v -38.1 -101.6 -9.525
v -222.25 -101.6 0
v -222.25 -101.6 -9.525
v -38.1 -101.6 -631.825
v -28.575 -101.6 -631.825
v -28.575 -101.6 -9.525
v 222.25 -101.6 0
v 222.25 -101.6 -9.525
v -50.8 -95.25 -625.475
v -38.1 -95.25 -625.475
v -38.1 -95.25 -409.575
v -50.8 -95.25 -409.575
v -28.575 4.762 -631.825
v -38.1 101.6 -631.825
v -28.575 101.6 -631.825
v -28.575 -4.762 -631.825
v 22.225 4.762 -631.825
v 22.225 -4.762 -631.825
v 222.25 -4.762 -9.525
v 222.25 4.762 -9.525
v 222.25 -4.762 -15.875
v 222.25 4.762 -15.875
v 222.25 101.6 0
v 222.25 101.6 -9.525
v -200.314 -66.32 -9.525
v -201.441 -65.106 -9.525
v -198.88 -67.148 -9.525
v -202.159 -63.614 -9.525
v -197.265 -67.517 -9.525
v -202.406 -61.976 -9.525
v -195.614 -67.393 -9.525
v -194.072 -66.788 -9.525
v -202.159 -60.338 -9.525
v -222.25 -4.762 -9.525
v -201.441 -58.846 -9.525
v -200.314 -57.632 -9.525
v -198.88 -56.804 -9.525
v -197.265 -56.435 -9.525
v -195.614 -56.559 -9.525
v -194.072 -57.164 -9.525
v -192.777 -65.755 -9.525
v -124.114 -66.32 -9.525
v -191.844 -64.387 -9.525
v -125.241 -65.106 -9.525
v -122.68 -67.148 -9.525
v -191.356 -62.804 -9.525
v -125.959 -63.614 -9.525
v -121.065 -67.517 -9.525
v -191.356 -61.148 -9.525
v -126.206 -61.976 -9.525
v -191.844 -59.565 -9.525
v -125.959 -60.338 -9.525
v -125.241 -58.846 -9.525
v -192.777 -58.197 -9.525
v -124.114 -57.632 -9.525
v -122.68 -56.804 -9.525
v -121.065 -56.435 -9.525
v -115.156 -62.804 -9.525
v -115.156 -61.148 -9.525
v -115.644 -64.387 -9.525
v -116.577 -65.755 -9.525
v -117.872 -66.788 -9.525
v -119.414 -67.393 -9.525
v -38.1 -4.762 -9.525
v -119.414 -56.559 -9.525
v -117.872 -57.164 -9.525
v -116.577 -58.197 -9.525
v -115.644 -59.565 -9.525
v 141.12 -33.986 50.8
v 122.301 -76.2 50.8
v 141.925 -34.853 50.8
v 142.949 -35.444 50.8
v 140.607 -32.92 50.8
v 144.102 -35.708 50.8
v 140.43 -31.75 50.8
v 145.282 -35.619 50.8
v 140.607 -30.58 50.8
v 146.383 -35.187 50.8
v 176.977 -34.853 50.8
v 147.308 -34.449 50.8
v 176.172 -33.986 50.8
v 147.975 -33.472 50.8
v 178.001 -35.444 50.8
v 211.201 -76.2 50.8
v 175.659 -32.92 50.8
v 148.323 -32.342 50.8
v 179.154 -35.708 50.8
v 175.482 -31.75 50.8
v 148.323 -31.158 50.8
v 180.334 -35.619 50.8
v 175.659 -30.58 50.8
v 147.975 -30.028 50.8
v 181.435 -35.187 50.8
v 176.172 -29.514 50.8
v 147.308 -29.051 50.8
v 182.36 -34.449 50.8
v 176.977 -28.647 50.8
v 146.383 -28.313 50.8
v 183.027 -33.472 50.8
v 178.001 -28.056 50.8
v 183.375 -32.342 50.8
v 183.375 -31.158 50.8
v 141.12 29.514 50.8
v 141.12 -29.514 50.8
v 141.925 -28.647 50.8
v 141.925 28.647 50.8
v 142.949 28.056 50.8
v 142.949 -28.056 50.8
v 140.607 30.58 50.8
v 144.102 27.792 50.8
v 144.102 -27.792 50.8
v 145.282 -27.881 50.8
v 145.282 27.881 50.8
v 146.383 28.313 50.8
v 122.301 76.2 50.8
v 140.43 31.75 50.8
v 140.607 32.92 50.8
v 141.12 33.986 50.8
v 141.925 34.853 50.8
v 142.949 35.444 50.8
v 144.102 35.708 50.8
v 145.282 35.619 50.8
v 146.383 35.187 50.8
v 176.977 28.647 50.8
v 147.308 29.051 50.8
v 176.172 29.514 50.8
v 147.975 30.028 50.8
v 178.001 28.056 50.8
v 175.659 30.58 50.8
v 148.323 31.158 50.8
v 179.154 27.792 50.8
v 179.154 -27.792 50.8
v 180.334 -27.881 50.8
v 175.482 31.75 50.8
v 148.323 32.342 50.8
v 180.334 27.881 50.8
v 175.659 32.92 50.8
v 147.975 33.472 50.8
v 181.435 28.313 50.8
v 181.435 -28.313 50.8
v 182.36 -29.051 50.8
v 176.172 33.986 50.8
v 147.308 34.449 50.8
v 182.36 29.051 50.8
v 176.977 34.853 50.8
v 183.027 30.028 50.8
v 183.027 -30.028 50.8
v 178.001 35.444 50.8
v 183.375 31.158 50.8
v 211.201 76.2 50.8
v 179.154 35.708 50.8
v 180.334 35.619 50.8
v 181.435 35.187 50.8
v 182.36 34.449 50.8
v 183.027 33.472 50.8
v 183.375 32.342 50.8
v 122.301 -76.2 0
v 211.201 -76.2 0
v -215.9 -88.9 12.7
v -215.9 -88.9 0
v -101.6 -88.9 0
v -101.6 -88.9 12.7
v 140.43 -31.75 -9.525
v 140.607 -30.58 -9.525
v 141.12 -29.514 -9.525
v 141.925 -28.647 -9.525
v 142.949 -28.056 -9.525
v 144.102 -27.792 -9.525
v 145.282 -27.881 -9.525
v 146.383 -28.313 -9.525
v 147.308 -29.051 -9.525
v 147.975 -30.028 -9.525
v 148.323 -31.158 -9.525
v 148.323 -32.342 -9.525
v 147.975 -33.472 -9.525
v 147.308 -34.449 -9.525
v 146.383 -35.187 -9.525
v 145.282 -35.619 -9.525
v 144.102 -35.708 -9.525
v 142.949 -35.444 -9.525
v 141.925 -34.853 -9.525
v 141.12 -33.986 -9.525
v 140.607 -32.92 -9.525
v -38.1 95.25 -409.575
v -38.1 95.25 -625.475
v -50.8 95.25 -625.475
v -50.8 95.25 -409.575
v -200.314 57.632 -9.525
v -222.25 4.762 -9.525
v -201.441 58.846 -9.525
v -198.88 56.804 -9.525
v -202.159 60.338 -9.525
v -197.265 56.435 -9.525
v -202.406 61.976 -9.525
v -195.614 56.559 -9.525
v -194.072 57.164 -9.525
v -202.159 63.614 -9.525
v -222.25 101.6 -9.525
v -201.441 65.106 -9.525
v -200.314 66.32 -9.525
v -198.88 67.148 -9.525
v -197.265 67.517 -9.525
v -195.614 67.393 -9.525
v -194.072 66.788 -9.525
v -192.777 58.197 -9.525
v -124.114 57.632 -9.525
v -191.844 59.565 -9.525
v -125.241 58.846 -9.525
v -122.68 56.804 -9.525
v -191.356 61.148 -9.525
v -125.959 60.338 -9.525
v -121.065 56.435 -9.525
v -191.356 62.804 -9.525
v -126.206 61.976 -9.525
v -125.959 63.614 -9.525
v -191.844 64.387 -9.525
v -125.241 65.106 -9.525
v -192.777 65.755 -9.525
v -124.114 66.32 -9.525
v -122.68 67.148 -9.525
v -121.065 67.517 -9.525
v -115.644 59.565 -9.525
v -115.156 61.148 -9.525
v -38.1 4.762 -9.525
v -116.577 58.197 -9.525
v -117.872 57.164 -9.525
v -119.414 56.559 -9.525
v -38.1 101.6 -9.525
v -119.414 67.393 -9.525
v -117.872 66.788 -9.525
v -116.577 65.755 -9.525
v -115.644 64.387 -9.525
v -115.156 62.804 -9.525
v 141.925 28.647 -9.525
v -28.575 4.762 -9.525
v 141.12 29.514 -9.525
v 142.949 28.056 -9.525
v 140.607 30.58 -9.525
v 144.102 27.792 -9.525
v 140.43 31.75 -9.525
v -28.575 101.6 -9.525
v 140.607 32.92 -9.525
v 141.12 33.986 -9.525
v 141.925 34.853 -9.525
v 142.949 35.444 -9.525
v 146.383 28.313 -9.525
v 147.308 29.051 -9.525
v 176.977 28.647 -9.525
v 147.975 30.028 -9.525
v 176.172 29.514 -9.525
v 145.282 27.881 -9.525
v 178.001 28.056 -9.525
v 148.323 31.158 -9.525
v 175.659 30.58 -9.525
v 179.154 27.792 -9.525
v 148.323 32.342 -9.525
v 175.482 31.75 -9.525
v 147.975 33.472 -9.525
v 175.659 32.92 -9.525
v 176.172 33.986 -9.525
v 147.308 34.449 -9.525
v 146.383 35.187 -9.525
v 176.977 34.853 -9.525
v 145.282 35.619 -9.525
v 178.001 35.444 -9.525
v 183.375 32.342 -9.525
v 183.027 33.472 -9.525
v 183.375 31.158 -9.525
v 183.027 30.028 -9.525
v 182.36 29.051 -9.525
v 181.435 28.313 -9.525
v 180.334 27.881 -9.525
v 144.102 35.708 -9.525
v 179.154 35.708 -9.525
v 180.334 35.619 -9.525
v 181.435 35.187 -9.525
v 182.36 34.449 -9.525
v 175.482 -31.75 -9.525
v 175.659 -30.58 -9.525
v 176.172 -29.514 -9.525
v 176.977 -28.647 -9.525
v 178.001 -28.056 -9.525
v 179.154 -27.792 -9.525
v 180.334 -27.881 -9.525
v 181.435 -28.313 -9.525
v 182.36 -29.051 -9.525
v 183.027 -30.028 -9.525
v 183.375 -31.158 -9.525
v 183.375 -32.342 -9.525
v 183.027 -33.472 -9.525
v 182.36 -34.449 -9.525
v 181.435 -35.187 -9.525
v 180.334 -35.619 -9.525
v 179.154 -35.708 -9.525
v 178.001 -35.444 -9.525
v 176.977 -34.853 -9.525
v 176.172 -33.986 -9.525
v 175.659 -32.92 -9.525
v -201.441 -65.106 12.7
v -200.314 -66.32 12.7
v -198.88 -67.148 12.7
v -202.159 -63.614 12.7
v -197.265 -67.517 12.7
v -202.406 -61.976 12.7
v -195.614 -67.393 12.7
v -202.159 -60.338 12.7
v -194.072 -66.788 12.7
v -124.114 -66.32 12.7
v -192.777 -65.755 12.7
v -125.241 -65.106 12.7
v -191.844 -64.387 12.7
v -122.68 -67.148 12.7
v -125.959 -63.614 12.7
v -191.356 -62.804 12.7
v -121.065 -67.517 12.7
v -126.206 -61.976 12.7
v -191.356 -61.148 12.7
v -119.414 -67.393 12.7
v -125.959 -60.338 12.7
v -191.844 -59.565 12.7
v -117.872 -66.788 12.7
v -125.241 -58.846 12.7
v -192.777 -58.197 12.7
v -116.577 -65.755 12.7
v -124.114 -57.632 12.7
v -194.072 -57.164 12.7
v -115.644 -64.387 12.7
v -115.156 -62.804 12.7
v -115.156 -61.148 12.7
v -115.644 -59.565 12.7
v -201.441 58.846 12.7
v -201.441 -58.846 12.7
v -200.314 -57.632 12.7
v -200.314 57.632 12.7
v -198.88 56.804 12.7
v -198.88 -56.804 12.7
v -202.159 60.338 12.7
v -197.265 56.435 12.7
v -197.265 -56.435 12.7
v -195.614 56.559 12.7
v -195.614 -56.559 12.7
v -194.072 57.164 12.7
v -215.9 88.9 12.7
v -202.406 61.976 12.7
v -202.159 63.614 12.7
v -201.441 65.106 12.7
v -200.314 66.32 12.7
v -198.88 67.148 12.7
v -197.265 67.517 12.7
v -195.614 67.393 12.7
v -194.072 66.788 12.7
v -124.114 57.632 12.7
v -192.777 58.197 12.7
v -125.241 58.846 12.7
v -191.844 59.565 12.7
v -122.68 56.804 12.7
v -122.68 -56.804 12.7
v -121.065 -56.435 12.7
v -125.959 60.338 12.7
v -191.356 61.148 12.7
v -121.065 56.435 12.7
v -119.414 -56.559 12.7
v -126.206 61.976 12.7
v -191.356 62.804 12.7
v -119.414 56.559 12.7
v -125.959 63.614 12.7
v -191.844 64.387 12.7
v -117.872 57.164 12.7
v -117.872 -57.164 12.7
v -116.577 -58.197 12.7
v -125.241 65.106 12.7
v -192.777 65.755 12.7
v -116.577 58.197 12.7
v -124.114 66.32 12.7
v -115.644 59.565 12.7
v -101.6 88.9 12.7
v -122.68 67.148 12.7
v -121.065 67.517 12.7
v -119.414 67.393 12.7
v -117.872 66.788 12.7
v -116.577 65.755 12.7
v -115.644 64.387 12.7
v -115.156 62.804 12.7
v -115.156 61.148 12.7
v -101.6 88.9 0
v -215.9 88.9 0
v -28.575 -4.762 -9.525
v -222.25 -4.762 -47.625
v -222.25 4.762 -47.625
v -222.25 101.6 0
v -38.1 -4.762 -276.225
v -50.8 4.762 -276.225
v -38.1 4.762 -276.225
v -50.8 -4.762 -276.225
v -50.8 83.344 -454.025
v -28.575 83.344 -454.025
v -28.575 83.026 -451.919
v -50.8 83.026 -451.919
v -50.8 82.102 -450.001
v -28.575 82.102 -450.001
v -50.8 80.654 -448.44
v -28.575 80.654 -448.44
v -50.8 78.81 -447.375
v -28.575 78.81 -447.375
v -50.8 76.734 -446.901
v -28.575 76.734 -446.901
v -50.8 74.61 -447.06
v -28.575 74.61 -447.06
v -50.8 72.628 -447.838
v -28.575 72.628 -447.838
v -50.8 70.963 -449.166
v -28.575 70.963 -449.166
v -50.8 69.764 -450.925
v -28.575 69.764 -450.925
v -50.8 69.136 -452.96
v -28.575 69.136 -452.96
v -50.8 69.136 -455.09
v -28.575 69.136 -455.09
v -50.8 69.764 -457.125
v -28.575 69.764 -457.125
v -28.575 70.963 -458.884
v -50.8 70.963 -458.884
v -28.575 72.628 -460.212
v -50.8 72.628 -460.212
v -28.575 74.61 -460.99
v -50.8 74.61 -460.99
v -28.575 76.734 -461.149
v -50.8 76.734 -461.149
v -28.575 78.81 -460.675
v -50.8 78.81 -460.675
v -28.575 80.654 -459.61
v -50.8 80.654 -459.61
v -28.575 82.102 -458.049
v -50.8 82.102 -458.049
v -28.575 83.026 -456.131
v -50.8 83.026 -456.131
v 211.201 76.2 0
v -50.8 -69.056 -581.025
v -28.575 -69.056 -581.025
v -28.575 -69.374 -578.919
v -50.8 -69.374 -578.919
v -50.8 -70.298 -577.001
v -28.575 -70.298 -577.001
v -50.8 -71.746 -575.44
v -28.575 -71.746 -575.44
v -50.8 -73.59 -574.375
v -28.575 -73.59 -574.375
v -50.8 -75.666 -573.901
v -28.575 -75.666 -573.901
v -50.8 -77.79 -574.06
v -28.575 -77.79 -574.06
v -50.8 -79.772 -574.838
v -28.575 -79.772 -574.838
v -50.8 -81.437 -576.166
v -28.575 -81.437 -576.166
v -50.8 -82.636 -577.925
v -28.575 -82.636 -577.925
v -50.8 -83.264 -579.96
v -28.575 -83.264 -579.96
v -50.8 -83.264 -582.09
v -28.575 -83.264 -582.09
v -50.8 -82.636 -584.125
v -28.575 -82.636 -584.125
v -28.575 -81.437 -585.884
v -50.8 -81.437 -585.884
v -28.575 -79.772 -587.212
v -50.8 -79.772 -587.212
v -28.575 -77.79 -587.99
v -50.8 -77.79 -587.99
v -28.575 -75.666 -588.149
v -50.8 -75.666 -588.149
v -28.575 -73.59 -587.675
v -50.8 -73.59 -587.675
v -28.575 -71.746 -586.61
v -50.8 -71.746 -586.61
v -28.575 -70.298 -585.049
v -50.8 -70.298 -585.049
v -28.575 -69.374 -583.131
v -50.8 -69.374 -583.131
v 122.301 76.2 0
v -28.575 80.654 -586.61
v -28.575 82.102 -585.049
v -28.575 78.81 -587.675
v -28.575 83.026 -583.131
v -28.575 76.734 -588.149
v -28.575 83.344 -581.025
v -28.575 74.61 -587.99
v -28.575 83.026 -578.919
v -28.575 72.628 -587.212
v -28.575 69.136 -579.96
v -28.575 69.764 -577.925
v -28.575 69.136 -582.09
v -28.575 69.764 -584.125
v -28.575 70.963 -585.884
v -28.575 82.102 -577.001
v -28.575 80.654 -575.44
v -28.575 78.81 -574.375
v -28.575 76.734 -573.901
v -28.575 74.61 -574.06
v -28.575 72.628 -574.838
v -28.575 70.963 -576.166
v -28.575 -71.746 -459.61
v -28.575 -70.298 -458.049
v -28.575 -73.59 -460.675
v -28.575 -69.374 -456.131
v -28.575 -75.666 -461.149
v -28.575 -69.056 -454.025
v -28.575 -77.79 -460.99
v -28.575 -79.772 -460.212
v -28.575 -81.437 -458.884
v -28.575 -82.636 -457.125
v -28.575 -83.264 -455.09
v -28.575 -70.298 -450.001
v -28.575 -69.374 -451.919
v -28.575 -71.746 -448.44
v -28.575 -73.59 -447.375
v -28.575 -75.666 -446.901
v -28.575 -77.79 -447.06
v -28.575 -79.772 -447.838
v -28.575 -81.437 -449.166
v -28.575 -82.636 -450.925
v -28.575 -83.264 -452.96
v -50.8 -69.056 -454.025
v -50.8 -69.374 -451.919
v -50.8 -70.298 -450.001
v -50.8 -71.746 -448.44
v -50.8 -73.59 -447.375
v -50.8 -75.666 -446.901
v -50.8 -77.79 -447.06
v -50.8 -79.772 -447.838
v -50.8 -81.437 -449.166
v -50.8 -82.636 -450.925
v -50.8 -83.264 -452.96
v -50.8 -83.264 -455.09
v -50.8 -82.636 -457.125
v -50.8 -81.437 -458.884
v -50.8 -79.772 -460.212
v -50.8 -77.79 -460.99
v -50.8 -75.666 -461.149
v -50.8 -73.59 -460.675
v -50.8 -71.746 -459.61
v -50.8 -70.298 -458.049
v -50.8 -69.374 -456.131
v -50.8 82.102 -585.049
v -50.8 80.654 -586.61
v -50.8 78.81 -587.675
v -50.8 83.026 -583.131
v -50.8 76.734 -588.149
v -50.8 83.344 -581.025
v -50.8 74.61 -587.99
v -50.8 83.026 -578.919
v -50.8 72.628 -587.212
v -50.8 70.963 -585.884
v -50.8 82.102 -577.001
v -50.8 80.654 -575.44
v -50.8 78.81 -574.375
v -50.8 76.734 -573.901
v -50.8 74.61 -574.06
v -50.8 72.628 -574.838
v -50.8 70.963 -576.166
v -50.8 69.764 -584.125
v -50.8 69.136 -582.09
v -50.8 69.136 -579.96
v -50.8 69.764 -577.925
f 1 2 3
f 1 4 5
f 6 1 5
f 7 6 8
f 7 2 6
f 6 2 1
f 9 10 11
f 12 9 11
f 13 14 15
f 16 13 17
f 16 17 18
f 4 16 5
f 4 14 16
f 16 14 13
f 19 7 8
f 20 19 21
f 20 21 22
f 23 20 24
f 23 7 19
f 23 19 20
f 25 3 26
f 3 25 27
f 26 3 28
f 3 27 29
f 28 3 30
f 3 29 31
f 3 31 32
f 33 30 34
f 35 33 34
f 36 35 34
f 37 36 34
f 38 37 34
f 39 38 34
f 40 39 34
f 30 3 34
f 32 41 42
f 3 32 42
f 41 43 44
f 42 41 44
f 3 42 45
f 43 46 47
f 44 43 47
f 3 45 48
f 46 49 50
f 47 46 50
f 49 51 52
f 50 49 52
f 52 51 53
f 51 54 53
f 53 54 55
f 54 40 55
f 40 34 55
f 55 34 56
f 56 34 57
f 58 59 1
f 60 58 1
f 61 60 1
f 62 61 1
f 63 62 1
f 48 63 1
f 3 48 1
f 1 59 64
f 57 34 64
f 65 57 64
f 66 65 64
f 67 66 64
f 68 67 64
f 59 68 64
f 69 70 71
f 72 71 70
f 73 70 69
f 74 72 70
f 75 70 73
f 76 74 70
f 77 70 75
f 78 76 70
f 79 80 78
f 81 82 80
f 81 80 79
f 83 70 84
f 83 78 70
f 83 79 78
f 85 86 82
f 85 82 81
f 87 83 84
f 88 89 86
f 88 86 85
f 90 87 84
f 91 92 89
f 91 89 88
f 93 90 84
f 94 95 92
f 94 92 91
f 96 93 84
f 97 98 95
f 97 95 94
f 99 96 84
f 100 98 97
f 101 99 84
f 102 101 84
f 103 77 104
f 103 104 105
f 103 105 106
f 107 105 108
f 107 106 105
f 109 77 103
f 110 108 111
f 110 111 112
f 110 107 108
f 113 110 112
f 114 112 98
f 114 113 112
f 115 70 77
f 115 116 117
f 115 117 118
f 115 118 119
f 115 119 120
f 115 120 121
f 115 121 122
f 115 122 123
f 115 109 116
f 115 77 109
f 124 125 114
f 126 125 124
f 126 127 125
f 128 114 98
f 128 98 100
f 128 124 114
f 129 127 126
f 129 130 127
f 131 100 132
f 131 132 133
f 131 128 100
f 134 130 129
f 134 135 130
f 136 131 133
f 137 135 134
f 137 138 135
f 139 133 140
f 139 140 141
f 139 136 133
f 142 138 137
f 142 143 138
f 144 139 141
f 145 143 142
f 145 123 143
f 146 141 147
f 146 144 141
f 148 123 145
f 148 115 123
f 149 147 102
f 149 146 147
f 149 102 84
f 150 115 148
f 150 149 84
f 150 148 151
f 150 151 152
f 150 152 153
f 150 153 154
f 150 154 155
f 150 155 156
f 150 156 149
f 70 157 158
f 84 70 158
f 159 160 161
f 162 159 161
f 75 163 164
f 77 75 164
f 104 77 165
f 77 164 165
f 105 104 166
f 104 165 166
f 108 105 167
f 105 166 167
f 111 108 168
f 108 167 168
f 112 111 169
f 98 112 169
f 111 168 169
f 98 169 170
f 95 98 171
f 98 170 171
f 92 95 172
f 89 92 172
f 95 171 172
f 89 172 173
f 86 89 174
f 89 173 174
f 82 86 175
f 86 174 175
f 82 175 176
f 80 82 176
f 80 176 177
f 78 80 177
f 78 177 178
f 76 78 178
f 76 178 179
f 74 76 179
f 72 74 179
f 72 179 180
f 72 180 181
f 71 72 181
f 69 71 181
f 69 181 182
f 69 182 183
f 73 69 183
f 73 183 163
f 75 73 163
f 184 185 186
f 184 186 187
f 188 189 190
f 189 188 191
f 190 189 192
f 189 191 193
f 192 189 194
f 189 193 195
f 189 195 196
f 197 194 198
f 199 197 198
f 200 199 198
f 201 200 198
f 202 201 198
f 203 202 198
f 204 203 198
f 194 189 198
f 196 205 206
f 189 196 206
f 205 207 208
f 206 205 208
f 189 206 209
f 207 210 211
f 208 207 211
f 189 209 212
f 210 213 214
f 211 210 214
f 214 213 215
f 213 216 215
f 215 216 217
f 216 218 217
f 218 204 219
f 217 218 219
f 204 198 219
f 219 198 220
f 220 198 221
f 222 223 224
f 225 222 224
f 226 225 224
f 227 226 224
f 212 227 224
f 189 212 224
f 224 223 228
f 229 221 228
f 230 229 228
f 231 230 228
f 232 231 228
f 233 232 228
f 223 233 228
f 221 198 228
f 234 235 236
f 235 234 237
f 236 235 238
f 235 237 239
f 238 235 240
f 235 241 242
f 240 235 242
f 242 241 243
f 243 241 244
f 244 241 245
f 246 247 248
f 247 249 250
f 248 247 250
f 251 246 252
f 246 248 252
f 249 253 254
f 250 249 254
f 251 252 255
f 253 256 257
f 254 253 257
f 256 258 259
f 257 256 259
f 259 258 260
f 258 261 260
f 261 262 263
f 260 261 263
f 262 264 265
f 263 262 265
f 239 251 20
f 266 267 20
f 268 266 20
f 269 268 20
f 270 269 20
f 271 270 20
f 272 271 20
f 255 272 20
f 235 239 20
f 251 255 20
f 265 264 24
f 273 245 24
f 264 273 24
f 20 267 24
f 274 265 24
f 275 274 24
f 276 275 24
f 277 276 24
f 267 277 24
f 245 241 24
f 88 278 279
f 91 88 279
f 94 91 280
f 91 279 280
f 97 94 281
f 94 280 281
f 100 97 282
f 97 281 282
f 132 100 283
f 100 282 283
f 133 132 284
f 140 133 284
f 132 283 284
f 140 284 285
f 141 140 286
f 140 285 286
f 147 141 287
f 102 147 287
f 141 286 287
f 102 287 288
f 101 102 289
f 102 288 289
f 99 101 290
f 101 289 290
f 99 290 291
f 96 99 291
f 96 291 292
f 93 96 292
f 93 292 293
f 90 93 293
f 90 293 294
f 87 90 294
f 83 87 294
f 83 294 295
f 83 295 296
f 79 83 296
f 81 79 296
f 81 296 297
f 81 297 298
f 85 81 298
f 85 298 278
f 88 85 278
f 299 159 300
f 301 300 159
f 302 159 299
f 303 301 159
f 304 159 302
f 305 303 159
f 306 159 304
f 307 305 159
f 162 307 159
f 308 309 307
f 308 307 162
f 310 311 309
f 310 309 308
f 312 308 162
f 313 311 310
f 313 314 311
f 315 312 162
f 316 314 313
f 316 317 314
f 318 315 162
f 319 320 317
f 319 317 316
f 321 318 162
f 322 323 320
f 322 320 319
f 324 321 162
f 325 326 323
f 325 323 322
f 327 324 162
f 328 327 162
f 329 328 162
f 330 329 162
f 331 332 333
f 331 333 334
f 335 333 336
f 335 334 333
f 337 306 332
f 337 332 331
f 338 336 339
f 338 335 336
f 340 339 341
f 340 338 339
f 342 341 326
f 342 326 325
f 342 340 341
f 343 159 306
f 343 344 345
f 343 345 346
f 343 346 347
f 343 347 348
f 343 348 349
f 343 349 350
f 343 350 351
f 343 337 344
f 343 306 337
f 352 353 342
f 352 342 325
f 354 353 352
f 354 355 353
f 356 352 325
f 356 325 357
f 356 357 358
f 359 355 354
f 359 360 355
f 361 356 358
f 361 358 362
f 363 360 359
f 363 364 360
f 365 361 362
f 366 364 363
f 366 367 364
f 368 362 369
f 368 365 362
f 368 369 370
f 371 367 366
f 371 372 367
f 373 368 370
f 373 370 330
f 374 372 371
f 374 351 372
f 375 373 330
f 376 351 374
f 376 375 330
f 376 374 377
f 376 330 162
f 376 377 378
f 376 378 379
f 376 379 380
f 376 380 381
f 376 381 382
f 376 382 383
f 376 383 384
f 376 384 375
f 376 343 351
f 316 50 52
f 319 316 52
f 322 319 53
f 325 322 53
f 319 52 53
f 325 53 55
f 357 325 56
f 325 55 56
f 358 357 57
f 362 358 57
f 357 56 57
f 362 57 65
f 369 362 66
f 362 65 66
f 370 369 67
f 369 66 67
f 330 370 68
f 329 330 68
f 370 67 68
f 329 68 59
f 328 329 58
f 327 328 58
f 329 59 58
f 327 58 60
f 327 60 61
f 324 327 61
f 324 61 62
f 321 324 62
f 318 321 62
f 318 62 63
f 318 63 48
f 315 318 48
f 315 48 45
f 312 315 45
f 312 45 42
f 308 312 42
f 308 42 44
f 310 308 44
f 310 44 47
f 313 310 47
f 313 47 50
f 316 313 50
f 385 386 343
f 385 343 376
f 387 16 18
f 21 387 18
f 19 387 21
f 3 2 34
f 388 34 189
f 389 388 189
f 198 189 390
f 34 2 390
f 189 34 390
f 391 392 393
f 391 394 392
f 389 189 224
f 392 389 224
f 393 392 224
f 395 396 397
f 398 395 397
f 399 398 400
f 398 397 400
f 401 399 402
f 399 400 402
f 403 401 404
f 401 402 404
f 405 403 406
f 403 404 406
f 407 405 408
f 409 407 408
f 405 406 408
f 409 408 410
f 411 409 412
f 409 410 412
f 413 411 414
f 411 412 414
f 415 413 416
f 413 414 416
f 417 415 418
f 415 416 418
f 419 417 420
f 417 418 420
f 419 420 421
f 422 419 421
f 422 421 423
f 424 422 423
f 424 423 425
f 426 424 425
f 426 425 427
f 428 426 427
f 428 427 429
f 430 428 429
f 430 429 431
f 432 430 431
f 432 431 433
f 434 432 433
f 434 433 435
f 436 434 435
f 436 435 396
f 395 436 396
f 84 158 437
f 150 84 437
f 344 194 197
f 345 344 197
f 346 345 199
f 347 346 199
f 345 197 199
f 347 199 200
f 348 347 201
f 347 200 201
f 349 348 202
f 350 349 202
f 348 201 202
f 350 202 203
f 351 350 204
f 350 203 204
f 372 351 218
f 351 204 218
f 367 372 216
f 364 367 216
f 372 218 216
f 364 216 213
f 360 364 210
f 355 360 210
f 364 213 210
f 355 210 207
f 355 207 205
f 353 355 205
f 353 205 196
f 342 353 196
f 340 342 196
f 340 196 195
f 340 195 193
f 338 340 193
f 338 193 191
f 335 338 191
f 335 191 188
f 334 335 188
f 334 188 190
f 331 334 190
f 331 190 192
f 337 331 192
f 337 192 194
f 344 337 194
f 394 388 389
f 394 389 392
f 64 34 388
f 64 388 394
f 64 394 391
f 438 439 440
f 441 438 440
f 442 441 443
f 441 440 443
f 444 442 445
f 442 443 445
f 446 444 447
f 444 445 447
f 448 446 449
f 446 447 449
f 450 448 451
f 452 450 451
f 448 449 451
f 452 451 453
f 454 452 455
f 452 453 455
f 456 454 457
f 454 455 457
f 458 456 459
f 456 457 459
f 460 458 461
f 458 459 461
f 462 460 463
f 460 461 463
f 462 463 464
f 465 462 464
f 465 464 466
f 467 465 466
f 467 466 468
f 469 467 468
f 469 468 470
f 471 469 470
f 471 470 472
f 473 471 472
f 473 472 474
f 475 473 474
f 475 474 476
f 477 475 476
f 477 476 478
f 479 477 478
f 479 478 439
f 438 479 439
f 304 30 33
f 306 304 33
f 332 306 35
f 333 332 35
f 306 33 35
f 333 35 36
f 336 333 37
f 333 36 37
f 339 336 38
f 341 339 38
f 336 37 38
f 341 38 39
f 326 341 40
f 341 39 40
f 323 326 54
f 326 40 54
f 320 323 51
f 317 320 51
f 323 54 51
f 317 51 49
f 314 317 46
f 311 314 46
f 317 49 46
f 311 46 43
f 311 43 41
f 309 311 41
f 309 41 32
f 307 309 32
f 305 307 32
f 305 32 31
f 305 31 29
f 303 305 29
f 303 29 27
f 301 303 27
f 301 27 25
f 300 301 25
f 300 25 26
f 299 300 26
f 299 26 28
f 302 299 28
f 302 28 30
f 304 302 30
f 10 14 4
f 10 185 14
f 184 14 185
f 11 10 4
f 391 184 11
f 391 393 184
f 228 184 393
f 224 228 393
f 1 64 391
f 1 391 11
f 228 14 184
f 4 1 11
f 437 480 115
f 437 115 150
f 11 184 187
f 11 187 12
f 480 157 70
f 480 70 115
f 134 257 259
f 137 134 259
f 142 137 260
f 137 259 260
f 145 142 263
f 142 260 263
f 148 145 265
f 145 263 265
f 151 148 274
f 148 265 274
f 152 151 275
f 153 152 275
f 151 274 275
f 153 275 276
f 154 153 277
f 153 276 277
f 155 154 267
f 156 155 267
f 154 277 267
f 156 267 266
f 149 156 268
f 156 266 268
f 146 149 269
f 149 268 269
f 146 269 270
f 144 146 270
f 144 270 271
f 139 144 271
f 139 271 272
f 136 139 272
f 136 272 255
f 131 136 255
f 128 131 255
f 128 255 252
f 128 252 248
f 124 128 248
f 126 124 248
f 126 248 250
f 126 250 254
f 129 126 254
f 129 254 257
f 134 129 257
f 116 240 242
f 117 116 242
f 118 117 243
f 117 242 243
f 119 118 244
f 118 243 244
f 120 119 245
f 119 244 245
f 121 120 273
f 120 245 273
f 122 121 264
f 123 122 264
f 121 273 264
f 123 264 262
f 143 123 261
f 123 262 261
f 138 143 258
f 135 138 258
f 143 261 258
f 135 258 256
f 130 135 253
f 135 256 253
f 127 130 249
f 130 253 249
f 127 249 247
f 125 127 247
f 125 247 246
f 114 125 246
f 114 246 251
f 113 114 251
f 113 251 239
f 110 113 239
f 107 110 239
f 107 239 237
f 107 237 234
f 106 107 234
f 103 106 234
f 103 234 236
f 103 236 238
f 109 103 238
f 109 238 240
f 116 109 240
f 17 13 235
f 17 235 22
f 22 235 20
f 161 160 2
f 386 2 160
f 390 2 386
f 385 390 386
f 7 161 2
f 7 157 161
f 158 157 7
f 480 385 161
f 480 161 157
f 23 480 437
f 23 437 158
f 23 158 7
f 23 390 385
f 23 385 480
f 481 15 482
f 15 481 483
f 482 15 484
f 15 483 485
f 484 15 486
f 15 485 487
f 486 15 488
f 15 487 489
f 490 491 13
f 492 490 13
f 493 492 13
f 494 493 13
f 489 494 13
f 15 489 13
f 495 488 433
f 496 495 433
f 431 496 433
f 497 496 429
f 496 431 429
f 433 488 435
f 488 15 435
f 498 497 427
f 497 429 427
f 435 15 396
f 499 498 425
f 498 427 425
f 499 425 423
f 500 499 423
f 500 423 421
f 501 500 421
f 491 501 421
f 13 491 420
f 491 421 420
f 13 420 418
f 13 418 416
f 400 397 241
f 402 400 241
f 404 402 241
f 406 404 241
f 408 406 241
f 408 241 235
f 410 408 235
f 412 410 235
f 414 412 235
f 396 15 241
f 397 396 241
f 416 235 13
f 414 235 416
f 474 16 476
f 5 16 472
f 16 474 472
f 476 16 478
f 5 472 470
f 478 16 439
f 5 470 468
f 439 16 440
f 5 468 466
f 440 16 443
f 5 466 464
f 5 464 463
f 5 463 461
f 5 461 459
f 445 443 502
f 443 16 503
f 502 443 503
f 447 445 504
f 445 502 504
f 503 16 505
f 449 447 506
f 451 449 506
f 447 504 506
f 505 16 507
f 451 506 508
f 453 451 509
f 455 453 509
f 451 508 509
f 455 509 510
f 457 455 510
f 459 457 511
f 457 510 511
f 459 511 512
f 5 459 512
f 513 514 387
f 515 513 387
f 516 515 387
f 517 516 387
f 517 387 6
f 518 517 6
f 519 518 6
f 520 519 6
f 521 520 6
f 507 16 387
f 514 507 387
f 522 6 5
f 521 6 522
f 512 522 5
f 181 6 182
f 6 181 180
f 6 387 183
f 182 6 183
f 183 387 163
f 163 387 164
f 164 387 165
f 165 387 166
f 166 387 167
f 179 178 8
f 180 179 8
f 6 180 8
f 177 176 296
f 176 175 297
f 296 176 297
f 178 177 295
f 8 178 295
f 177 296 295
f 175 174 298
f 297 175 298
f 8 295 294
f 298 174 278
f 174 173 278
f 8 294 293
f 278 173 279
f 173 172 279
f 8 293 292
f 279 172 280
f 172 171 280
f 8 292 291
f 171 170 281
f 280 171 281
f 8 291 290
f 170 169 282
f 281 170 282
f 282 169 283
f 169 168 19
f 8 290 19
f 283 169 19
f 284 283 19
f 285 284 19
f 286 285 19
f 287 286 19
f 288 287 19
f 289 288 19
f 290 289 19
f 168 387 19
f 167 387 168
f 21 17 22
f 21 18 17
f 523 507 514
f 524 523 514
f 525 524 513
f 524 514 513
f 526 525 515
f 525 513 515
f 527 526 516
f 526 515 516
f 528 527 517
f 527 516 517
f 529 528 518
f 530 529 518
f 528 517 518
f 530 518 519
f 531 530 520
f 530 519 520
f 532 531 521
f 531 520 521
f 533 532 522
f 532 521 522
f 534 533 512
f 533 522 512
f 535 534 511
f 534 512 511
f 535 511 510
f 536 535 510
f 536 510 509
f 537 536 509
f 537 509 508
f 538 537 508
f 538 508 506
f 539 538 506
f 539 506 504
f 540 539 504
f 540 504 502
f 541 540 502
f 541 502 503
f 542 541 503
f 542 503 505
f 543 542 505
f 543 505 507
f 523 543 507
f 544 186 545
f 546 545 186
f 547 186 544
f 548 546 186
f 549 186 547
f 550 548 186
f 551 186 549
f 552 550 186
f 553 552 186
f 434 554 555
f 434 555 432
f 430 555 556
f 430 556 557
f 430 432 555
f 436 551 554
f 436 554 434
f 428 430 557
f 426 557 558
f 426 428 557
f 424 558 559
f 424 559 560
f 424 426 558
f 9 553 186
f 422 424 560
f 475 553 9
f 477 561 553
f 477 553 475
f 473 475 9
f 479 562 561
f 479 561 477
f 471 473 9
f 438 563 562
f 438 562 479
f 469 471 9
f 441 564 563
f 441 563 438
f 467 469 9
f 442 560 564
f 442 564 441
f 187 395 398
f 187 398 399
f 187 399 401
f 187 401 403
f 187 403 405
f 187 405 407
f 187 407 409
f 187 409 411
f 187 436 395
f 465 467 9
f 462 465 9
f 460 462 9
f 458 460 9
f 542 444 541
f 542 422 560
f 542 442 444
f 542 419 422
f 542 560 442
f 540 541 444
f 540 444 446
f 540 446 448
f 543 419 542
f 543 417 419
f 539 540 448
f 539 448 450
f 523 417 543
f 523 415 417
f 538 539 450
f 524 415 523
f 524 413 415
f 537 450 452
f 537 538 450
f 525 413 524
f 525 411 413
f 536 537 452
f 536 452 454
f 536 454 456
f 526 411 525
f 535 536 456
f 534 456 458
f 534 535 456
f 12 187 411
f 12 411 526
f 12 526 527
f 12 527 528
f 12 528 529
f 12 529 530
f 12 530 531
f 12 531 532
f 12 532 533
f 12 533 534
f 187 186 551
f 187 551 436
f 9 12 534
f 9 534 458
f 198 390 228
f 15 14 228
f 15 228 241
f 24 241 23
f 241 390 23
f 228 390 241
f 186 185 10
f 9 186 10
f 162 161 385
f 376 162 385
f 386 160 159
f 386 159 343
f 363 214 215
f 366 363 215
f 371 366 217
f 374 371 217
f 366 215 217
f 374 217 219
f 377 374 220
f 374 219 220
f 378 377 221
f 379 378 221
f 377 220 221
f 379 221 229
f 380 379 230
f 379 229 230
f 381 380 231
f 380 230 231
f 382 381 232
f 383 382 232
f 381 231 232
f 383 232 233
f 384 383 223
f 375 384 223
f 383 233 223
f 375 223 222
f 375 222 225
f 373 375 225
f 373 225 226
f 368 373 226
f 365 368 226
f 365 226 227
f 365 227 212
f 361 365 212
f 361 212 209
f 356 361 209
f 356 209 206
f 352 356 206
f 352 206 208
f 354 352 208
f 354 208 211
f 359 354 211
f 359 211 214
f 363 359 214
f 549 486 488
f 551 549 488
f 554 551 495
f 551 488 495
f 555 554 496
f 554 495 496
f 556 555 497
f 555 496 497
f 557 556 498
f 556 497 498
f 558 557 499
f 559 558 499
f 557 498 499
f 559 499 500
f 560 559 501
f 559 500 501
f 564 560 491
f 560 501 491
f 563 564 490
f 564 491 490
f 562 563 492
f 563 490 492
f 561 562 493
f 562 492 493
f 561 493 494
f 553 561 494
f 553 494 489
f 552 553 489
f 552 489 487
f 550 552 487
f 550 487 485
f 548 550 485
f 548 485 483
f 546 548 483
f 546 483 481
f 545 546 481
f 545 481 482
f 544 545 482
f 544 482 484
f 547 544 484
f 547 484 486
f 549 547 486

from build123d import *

# Parameters (mm, degrees)
F0_W      = 444.5
F0_H      = 203.2
F1_DEPTH  = 9.525
F2_W      = 114.3
F2_H      = 177.8
F3_DEPTH  = 12.7
F5_D      = 11.1125
F6_W      = 88.9
F6_H      = 152.4
F7_DEPTH  = 50.8
F9_D      = 7.9375
F11_W     = 203.2
F11_H     = 622.3
F12_DEPTH = 9.525
F14_DEPTH = 4.7625
F16_DEPTH = 4.7625
F17_W     = 190.5
F17_H     = 215.9
F18_DEPTH = 12.7
F20_D     = 14.2875


with BuildPart() as f1:
    # F0 (on Top) → F1 (new body)
    with BuildSketch(Plane.XY):
        Rectangle(F0_W, F0_H)
    extrude(amount=-F1_DEPTH)

    # F2 (on face) → F3 (join)
    with BuildSketch(Plane.XY):
        with Locations((-158.75, 0)):
            Rectangle(F2_W, F2_H)
    extrude(amount=F3_DEPTH)

    # F5 (through all)
    with Locations(Plane.XY.offset(12.7)):
        with Locations((-196.85, 61.976), (-120.65, 61.976), (-196.85, -61.976), (-120.65, -61.976)):
            Hole(F5_D / 2)

    # F6 (on face) → F7 (join)
    with BuildSketch(Plane.XY):
        with Locations((166.751, 0)):
            Rectangle(F6_W, F6_H)
    extrude(amount=F7_DEPTH)

    # F9 (through all)
    with Locations(Plane.XY.offset(50.8)):
        with Locations((144.399, 31.75), (179.451, 31.75), (144.399, -31.75), (179.451, -31.75)):
            Hole(F9_D / 2)

    # F11 (on offset) → F12 (join)
    with BuildSketch(Plane(origin=(-38.1, 0, 0), x_dir=(0, -1, 0), z_dir=(-1, 0, 0))):
        with Locations((0, -320.675)):
            Rectangle(F11_W, F11_H)
    extrude(amount=-F12_DEPTH)

    # F13 (on Front) → F14 (join, symmetric)
    with BuildSketch(Plane.XZ):
        Polygon((-38.1, -9.525), (-222.25, -9.525), (-222.25, -47.625), (-50.8, -276.225), (-38.1, -276.225), align=None)
    extrude(amount=F14_DEPTH, both=True)

    # F15 (on Front) → F16 (join, symmetric)
    with BuildSketch(Plane.XZ):
        Polygon((222.25, -9.525), (-28.575, -9.525), (-28.575, -631.825), (22.225, -631.825), (222.25, -15.875), align=None)
    extrude(amount=F16_DEPTH, both=True)

    # F17 (on face) → F18 (join)
    with BuildSketch(Plane(origin=(-38.1, 0, 0), x_dir=(0, -1, 0), z_dir=(-1, 0, 0))):
        with Locations((0, -517.525)):
            Rectangle(F17_W, F17_H)
    extrude(amount=F18_DEPTH)

    # F20 (through all)
    with Locations(Plane(origin=(-50.8, 0, 0), x_dir=(0, -1, 0), z_dir=(-1, 0, 0))):
        with Locations((-76.2, -454.025), (76.2, -454.025), (-76.2, -581.025), (76.2, -581.025)):
            Hole(F20_D / 2)


solid = f1.part
